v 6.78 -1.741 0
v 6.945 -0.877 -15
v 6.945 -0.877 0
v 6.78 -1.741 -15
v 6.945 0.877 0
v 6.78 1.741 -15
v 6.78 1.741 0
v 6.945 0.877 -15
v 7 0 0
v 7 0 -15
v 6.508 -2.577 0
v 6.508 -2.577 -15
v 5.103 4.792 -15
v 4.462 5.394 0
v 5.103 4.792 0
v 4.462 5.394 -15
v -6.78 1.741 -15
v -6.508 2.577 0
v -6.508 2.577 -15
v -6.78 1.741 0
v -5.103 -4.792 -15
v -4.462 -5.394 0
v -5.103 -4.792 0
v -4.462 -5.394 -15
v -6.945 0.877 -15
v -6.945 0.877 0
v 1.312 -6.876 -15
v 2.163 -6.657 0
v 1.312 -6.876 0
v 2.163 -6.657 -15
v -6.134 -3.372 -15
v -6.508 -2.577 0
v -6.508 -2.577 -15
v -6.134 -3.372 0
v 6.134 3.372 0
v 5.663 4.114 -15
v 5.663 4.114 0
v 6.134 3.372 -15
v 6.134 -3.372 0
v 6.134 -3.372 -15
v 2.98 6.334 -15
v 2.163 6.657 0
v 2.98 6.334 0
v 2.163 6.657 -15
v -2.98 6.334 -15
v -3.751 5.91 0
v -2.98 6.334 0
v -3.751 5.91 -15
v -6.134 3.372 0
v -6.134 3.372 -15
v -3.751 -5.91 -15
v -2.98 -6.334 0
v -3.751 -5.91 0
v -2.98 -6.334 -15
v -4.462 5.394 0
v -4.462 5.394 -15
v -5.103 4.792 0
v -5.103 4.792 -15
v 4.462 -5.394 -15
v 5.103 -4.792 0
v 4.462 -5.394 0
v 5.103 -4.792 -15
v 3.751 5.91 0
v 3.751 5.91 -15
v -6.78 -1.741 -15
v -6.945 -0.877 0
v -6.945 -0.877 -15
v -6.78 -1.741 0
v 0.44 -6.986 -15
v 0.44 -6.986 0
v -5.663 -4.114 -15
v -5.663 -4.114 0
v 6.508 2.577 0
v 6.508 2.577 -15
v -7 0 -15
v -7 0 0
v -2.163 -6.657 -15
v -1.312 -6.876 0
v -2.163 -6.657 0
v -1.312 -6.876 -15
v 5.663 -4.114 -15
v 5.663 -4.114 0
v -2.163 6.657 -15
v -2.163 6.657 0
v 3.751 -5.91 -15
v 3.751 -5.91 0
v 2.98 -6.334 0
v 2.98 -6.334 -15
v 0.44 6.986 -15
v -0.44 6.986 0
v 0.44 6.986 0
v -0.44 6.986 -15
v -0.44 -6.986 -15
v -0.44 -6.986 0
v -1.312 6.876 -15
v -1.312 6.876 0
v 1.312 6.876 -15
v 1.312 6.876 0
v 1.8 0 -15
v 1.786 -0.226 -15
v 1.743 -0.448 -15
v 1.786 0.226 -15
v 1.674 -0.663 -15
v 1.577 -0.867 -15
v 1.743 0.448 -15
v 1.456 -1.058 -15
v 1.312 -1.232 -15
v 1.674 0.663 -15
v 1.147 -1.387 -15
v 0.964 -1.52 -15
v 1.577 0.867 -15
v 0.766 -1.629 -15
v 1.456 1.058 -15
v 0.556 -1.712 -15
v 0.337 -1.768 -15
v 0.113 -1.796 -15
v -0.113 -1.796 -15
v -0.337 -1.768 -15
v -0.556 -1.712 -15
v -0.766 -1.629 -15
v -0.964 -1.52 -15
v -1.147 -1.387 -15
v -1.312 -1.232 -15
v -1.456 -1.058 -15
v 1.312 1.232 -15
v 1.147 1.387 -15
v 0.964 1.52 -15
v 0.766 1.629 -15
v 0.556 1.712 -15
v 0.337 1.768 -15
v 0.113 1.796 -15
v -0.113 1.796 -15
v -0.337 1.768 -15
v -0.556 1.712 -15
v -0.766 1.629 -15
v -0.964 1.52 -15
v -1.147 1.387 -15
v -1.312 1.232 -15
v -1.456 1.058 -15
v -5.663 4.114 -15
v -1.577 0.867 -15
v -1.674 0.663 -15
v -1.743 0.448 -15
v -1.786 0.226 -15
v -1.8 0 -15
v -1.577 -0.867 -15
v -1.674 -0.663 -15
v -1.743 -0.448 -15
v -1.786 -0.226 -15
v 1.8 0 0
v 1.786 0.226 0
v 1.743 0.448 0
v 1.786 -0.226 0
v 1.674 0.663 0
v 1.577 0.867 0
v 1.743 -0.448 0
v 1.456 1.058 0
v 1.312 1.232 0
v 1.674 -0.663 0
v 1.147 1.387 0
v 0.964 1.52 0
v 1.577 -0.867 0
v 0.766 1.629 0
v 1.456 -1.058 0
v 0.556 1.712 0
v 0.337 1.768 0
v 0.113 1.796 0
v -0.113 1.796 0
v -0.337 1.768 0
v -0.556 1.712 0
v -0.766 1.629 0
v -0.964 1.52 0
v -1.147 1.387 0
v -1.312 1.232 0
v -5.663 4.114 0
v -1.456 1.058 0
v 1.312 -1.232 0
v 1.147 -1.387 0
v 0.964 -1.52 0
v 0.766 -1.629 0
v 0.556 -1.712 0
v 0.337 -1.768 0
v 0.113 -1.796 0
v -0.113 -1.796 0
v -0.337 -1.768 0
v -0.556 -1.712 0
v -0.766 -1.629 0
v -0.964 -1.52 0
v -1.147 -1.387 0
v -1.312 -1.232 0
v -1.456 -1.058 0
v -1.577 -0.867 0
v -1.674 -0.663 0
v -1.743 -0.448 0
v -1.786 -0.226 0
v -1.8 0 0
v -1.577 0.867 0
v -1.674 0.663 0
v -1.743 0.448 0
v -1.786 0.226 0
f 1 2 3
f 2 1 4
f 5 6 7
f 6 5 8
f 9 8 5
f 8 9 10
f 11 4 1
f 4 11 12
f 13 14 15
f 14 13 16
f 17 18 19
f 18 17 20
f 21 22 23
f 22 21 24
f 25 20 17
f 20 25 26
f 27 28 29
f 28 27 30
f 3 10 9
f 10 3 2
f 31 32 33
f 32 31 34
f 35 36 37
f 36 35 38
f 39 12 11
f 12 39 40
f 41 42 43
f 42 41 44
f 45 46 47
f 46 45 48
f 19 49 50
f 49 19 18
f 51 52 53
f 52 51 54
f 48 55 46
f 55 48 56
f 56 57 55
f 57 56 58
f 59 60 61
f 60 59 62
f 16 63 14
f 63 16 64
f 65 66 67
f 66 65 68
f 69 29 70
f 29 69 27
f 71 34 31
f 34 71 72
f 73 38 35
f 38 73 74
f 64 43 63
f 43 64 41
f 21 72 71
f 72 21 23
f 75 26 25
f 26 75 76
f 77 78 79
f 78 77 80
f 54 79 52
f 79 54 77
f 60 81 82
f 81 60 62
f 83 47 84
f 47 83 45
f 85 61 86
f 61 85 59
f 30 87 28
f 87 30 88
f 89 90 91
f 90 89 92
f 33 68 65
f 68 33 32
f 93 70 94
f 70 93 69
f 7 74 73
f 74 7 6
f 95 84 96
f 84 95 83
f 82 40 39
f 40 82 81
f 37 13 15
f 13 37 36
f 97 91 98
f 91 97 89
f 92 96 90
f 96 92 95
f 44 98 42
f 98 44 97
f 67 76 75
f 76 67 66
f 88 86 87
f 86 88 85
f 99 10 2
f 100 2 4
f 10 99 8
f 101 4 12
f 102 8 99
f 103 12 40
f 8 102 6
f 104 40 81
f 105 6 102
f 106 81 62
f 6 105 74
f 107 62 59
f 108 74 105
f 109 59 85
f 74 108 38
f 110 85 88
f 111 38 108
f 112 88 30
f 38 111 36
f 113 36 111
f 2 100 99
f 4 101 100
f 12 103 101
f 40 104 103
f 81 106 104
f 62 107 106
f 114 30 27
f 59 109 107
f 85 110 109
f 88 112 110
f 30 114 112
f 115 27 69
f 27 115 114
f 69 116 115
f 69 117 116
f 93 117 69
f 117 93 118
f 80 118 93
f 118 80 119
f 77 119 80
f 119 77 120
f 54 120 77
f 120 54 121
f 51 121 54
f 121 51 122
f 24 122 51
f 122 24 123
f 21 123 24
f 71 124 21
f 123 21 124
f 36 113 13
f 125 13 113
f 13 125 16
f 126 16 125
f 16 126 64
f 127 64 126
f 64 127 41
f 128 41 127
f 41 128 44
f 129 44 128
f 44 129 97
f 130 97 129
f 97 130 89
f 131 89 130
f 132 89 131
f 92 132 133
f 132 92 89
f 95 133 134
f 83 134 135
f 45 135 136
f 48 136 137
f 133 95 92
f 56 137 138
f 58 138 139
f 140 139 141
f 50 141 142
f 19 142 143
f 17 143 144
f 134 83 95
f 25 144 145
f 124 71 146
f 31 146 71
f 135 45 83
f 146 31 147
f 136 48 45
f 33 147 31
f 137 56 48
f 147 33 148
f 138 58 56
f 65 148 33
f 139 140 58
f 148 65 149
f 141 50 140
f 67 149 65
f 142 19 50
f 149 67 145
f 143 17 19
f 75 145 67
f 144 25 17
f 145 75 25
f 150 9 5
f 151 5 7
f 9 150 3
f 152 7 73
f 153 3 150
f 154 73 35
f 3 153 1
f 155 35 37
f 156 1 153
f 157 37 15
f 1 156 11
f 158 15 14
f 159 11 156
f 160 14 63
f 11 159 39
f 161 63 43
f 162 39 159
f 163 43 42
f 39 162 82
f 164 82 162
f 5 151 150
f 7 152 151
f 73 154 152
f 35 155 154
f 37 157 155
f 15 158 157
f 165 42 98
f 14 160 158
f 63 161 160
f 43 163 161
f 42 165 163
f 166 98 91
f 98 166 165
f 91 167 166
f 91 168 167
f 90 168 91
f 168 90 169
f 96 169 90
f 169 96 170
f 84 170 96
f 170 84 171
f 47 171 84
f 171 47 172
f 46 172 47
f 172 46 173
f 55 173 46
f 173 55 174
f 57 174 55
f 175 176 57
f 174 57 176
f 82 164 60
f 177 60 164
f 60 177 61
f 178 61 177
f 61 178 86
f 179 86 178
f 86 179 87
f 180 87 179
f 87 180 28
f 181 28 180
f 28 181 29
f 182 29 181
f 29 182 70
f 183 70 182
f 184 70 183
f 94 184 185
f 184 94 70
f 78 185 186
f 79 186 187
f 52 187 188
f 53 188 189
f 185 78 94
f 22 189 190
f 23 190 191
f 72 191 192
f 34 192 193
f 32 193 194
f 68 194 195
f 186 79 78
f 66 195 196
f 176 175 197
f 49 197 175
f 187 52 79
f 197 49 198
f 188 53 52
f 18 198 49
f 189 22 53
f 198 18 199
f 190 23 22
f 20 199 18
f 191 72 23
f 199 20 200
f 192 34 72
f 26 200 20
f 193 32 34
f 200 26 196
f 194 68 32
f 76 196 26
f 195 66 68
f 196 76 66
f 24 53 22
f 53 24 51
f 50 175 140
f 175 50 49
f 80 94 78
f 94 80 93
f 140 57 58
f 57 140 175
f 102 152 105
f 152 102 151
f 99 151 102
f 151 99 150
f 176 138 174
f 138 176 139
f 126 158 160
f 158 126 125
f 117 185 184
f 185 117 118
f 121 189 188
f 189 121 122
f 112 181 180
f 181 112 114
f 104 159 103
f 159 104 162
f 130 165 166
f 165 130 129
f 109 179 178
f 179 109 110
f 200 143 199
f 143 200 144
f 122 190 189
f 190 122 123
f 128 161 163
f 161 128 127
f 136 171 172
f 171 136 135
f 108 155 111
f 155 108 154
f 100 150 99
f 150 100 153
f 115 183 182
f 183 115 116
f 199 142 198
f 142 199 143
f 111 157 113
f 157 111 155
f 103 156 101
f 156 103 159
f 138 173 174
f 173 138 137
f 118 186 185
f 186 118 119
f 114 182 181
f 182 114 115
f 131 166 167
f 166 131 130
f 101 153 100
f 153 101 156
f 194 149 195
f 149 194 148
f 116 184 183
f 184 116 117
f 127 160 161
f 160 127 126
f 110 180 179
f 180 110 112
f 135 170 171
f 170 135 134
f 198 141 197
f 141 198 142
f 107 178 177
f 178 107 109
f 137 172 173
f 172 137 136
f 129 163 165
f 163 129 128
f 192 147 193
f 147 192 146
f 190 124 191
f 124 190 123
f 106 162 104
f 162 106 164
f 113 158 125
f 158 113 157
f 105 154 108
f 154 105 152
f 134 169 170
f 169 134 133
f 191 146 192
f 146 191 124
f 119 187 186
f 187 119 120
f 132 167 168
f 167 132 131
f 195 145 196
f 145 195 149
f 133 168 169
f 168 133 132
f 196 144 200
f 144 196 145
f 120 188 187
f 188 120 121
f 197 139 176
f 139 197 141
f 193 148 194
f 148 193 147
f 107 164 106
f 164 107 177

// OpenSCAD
$fn = 50;


difference() {
	union() {
		translate(v = [0, 0, -15.0000000000]) {
			cylinder(h = 15, r = 7.0000000000);
		}
		cylinder(h = 0, r = 10.0000000000);
	}
	union() {
		#translate(v = [0, 0, -15]) {
			cylinder(h = 15, r = 1.8000000000);
		}
	}
}
